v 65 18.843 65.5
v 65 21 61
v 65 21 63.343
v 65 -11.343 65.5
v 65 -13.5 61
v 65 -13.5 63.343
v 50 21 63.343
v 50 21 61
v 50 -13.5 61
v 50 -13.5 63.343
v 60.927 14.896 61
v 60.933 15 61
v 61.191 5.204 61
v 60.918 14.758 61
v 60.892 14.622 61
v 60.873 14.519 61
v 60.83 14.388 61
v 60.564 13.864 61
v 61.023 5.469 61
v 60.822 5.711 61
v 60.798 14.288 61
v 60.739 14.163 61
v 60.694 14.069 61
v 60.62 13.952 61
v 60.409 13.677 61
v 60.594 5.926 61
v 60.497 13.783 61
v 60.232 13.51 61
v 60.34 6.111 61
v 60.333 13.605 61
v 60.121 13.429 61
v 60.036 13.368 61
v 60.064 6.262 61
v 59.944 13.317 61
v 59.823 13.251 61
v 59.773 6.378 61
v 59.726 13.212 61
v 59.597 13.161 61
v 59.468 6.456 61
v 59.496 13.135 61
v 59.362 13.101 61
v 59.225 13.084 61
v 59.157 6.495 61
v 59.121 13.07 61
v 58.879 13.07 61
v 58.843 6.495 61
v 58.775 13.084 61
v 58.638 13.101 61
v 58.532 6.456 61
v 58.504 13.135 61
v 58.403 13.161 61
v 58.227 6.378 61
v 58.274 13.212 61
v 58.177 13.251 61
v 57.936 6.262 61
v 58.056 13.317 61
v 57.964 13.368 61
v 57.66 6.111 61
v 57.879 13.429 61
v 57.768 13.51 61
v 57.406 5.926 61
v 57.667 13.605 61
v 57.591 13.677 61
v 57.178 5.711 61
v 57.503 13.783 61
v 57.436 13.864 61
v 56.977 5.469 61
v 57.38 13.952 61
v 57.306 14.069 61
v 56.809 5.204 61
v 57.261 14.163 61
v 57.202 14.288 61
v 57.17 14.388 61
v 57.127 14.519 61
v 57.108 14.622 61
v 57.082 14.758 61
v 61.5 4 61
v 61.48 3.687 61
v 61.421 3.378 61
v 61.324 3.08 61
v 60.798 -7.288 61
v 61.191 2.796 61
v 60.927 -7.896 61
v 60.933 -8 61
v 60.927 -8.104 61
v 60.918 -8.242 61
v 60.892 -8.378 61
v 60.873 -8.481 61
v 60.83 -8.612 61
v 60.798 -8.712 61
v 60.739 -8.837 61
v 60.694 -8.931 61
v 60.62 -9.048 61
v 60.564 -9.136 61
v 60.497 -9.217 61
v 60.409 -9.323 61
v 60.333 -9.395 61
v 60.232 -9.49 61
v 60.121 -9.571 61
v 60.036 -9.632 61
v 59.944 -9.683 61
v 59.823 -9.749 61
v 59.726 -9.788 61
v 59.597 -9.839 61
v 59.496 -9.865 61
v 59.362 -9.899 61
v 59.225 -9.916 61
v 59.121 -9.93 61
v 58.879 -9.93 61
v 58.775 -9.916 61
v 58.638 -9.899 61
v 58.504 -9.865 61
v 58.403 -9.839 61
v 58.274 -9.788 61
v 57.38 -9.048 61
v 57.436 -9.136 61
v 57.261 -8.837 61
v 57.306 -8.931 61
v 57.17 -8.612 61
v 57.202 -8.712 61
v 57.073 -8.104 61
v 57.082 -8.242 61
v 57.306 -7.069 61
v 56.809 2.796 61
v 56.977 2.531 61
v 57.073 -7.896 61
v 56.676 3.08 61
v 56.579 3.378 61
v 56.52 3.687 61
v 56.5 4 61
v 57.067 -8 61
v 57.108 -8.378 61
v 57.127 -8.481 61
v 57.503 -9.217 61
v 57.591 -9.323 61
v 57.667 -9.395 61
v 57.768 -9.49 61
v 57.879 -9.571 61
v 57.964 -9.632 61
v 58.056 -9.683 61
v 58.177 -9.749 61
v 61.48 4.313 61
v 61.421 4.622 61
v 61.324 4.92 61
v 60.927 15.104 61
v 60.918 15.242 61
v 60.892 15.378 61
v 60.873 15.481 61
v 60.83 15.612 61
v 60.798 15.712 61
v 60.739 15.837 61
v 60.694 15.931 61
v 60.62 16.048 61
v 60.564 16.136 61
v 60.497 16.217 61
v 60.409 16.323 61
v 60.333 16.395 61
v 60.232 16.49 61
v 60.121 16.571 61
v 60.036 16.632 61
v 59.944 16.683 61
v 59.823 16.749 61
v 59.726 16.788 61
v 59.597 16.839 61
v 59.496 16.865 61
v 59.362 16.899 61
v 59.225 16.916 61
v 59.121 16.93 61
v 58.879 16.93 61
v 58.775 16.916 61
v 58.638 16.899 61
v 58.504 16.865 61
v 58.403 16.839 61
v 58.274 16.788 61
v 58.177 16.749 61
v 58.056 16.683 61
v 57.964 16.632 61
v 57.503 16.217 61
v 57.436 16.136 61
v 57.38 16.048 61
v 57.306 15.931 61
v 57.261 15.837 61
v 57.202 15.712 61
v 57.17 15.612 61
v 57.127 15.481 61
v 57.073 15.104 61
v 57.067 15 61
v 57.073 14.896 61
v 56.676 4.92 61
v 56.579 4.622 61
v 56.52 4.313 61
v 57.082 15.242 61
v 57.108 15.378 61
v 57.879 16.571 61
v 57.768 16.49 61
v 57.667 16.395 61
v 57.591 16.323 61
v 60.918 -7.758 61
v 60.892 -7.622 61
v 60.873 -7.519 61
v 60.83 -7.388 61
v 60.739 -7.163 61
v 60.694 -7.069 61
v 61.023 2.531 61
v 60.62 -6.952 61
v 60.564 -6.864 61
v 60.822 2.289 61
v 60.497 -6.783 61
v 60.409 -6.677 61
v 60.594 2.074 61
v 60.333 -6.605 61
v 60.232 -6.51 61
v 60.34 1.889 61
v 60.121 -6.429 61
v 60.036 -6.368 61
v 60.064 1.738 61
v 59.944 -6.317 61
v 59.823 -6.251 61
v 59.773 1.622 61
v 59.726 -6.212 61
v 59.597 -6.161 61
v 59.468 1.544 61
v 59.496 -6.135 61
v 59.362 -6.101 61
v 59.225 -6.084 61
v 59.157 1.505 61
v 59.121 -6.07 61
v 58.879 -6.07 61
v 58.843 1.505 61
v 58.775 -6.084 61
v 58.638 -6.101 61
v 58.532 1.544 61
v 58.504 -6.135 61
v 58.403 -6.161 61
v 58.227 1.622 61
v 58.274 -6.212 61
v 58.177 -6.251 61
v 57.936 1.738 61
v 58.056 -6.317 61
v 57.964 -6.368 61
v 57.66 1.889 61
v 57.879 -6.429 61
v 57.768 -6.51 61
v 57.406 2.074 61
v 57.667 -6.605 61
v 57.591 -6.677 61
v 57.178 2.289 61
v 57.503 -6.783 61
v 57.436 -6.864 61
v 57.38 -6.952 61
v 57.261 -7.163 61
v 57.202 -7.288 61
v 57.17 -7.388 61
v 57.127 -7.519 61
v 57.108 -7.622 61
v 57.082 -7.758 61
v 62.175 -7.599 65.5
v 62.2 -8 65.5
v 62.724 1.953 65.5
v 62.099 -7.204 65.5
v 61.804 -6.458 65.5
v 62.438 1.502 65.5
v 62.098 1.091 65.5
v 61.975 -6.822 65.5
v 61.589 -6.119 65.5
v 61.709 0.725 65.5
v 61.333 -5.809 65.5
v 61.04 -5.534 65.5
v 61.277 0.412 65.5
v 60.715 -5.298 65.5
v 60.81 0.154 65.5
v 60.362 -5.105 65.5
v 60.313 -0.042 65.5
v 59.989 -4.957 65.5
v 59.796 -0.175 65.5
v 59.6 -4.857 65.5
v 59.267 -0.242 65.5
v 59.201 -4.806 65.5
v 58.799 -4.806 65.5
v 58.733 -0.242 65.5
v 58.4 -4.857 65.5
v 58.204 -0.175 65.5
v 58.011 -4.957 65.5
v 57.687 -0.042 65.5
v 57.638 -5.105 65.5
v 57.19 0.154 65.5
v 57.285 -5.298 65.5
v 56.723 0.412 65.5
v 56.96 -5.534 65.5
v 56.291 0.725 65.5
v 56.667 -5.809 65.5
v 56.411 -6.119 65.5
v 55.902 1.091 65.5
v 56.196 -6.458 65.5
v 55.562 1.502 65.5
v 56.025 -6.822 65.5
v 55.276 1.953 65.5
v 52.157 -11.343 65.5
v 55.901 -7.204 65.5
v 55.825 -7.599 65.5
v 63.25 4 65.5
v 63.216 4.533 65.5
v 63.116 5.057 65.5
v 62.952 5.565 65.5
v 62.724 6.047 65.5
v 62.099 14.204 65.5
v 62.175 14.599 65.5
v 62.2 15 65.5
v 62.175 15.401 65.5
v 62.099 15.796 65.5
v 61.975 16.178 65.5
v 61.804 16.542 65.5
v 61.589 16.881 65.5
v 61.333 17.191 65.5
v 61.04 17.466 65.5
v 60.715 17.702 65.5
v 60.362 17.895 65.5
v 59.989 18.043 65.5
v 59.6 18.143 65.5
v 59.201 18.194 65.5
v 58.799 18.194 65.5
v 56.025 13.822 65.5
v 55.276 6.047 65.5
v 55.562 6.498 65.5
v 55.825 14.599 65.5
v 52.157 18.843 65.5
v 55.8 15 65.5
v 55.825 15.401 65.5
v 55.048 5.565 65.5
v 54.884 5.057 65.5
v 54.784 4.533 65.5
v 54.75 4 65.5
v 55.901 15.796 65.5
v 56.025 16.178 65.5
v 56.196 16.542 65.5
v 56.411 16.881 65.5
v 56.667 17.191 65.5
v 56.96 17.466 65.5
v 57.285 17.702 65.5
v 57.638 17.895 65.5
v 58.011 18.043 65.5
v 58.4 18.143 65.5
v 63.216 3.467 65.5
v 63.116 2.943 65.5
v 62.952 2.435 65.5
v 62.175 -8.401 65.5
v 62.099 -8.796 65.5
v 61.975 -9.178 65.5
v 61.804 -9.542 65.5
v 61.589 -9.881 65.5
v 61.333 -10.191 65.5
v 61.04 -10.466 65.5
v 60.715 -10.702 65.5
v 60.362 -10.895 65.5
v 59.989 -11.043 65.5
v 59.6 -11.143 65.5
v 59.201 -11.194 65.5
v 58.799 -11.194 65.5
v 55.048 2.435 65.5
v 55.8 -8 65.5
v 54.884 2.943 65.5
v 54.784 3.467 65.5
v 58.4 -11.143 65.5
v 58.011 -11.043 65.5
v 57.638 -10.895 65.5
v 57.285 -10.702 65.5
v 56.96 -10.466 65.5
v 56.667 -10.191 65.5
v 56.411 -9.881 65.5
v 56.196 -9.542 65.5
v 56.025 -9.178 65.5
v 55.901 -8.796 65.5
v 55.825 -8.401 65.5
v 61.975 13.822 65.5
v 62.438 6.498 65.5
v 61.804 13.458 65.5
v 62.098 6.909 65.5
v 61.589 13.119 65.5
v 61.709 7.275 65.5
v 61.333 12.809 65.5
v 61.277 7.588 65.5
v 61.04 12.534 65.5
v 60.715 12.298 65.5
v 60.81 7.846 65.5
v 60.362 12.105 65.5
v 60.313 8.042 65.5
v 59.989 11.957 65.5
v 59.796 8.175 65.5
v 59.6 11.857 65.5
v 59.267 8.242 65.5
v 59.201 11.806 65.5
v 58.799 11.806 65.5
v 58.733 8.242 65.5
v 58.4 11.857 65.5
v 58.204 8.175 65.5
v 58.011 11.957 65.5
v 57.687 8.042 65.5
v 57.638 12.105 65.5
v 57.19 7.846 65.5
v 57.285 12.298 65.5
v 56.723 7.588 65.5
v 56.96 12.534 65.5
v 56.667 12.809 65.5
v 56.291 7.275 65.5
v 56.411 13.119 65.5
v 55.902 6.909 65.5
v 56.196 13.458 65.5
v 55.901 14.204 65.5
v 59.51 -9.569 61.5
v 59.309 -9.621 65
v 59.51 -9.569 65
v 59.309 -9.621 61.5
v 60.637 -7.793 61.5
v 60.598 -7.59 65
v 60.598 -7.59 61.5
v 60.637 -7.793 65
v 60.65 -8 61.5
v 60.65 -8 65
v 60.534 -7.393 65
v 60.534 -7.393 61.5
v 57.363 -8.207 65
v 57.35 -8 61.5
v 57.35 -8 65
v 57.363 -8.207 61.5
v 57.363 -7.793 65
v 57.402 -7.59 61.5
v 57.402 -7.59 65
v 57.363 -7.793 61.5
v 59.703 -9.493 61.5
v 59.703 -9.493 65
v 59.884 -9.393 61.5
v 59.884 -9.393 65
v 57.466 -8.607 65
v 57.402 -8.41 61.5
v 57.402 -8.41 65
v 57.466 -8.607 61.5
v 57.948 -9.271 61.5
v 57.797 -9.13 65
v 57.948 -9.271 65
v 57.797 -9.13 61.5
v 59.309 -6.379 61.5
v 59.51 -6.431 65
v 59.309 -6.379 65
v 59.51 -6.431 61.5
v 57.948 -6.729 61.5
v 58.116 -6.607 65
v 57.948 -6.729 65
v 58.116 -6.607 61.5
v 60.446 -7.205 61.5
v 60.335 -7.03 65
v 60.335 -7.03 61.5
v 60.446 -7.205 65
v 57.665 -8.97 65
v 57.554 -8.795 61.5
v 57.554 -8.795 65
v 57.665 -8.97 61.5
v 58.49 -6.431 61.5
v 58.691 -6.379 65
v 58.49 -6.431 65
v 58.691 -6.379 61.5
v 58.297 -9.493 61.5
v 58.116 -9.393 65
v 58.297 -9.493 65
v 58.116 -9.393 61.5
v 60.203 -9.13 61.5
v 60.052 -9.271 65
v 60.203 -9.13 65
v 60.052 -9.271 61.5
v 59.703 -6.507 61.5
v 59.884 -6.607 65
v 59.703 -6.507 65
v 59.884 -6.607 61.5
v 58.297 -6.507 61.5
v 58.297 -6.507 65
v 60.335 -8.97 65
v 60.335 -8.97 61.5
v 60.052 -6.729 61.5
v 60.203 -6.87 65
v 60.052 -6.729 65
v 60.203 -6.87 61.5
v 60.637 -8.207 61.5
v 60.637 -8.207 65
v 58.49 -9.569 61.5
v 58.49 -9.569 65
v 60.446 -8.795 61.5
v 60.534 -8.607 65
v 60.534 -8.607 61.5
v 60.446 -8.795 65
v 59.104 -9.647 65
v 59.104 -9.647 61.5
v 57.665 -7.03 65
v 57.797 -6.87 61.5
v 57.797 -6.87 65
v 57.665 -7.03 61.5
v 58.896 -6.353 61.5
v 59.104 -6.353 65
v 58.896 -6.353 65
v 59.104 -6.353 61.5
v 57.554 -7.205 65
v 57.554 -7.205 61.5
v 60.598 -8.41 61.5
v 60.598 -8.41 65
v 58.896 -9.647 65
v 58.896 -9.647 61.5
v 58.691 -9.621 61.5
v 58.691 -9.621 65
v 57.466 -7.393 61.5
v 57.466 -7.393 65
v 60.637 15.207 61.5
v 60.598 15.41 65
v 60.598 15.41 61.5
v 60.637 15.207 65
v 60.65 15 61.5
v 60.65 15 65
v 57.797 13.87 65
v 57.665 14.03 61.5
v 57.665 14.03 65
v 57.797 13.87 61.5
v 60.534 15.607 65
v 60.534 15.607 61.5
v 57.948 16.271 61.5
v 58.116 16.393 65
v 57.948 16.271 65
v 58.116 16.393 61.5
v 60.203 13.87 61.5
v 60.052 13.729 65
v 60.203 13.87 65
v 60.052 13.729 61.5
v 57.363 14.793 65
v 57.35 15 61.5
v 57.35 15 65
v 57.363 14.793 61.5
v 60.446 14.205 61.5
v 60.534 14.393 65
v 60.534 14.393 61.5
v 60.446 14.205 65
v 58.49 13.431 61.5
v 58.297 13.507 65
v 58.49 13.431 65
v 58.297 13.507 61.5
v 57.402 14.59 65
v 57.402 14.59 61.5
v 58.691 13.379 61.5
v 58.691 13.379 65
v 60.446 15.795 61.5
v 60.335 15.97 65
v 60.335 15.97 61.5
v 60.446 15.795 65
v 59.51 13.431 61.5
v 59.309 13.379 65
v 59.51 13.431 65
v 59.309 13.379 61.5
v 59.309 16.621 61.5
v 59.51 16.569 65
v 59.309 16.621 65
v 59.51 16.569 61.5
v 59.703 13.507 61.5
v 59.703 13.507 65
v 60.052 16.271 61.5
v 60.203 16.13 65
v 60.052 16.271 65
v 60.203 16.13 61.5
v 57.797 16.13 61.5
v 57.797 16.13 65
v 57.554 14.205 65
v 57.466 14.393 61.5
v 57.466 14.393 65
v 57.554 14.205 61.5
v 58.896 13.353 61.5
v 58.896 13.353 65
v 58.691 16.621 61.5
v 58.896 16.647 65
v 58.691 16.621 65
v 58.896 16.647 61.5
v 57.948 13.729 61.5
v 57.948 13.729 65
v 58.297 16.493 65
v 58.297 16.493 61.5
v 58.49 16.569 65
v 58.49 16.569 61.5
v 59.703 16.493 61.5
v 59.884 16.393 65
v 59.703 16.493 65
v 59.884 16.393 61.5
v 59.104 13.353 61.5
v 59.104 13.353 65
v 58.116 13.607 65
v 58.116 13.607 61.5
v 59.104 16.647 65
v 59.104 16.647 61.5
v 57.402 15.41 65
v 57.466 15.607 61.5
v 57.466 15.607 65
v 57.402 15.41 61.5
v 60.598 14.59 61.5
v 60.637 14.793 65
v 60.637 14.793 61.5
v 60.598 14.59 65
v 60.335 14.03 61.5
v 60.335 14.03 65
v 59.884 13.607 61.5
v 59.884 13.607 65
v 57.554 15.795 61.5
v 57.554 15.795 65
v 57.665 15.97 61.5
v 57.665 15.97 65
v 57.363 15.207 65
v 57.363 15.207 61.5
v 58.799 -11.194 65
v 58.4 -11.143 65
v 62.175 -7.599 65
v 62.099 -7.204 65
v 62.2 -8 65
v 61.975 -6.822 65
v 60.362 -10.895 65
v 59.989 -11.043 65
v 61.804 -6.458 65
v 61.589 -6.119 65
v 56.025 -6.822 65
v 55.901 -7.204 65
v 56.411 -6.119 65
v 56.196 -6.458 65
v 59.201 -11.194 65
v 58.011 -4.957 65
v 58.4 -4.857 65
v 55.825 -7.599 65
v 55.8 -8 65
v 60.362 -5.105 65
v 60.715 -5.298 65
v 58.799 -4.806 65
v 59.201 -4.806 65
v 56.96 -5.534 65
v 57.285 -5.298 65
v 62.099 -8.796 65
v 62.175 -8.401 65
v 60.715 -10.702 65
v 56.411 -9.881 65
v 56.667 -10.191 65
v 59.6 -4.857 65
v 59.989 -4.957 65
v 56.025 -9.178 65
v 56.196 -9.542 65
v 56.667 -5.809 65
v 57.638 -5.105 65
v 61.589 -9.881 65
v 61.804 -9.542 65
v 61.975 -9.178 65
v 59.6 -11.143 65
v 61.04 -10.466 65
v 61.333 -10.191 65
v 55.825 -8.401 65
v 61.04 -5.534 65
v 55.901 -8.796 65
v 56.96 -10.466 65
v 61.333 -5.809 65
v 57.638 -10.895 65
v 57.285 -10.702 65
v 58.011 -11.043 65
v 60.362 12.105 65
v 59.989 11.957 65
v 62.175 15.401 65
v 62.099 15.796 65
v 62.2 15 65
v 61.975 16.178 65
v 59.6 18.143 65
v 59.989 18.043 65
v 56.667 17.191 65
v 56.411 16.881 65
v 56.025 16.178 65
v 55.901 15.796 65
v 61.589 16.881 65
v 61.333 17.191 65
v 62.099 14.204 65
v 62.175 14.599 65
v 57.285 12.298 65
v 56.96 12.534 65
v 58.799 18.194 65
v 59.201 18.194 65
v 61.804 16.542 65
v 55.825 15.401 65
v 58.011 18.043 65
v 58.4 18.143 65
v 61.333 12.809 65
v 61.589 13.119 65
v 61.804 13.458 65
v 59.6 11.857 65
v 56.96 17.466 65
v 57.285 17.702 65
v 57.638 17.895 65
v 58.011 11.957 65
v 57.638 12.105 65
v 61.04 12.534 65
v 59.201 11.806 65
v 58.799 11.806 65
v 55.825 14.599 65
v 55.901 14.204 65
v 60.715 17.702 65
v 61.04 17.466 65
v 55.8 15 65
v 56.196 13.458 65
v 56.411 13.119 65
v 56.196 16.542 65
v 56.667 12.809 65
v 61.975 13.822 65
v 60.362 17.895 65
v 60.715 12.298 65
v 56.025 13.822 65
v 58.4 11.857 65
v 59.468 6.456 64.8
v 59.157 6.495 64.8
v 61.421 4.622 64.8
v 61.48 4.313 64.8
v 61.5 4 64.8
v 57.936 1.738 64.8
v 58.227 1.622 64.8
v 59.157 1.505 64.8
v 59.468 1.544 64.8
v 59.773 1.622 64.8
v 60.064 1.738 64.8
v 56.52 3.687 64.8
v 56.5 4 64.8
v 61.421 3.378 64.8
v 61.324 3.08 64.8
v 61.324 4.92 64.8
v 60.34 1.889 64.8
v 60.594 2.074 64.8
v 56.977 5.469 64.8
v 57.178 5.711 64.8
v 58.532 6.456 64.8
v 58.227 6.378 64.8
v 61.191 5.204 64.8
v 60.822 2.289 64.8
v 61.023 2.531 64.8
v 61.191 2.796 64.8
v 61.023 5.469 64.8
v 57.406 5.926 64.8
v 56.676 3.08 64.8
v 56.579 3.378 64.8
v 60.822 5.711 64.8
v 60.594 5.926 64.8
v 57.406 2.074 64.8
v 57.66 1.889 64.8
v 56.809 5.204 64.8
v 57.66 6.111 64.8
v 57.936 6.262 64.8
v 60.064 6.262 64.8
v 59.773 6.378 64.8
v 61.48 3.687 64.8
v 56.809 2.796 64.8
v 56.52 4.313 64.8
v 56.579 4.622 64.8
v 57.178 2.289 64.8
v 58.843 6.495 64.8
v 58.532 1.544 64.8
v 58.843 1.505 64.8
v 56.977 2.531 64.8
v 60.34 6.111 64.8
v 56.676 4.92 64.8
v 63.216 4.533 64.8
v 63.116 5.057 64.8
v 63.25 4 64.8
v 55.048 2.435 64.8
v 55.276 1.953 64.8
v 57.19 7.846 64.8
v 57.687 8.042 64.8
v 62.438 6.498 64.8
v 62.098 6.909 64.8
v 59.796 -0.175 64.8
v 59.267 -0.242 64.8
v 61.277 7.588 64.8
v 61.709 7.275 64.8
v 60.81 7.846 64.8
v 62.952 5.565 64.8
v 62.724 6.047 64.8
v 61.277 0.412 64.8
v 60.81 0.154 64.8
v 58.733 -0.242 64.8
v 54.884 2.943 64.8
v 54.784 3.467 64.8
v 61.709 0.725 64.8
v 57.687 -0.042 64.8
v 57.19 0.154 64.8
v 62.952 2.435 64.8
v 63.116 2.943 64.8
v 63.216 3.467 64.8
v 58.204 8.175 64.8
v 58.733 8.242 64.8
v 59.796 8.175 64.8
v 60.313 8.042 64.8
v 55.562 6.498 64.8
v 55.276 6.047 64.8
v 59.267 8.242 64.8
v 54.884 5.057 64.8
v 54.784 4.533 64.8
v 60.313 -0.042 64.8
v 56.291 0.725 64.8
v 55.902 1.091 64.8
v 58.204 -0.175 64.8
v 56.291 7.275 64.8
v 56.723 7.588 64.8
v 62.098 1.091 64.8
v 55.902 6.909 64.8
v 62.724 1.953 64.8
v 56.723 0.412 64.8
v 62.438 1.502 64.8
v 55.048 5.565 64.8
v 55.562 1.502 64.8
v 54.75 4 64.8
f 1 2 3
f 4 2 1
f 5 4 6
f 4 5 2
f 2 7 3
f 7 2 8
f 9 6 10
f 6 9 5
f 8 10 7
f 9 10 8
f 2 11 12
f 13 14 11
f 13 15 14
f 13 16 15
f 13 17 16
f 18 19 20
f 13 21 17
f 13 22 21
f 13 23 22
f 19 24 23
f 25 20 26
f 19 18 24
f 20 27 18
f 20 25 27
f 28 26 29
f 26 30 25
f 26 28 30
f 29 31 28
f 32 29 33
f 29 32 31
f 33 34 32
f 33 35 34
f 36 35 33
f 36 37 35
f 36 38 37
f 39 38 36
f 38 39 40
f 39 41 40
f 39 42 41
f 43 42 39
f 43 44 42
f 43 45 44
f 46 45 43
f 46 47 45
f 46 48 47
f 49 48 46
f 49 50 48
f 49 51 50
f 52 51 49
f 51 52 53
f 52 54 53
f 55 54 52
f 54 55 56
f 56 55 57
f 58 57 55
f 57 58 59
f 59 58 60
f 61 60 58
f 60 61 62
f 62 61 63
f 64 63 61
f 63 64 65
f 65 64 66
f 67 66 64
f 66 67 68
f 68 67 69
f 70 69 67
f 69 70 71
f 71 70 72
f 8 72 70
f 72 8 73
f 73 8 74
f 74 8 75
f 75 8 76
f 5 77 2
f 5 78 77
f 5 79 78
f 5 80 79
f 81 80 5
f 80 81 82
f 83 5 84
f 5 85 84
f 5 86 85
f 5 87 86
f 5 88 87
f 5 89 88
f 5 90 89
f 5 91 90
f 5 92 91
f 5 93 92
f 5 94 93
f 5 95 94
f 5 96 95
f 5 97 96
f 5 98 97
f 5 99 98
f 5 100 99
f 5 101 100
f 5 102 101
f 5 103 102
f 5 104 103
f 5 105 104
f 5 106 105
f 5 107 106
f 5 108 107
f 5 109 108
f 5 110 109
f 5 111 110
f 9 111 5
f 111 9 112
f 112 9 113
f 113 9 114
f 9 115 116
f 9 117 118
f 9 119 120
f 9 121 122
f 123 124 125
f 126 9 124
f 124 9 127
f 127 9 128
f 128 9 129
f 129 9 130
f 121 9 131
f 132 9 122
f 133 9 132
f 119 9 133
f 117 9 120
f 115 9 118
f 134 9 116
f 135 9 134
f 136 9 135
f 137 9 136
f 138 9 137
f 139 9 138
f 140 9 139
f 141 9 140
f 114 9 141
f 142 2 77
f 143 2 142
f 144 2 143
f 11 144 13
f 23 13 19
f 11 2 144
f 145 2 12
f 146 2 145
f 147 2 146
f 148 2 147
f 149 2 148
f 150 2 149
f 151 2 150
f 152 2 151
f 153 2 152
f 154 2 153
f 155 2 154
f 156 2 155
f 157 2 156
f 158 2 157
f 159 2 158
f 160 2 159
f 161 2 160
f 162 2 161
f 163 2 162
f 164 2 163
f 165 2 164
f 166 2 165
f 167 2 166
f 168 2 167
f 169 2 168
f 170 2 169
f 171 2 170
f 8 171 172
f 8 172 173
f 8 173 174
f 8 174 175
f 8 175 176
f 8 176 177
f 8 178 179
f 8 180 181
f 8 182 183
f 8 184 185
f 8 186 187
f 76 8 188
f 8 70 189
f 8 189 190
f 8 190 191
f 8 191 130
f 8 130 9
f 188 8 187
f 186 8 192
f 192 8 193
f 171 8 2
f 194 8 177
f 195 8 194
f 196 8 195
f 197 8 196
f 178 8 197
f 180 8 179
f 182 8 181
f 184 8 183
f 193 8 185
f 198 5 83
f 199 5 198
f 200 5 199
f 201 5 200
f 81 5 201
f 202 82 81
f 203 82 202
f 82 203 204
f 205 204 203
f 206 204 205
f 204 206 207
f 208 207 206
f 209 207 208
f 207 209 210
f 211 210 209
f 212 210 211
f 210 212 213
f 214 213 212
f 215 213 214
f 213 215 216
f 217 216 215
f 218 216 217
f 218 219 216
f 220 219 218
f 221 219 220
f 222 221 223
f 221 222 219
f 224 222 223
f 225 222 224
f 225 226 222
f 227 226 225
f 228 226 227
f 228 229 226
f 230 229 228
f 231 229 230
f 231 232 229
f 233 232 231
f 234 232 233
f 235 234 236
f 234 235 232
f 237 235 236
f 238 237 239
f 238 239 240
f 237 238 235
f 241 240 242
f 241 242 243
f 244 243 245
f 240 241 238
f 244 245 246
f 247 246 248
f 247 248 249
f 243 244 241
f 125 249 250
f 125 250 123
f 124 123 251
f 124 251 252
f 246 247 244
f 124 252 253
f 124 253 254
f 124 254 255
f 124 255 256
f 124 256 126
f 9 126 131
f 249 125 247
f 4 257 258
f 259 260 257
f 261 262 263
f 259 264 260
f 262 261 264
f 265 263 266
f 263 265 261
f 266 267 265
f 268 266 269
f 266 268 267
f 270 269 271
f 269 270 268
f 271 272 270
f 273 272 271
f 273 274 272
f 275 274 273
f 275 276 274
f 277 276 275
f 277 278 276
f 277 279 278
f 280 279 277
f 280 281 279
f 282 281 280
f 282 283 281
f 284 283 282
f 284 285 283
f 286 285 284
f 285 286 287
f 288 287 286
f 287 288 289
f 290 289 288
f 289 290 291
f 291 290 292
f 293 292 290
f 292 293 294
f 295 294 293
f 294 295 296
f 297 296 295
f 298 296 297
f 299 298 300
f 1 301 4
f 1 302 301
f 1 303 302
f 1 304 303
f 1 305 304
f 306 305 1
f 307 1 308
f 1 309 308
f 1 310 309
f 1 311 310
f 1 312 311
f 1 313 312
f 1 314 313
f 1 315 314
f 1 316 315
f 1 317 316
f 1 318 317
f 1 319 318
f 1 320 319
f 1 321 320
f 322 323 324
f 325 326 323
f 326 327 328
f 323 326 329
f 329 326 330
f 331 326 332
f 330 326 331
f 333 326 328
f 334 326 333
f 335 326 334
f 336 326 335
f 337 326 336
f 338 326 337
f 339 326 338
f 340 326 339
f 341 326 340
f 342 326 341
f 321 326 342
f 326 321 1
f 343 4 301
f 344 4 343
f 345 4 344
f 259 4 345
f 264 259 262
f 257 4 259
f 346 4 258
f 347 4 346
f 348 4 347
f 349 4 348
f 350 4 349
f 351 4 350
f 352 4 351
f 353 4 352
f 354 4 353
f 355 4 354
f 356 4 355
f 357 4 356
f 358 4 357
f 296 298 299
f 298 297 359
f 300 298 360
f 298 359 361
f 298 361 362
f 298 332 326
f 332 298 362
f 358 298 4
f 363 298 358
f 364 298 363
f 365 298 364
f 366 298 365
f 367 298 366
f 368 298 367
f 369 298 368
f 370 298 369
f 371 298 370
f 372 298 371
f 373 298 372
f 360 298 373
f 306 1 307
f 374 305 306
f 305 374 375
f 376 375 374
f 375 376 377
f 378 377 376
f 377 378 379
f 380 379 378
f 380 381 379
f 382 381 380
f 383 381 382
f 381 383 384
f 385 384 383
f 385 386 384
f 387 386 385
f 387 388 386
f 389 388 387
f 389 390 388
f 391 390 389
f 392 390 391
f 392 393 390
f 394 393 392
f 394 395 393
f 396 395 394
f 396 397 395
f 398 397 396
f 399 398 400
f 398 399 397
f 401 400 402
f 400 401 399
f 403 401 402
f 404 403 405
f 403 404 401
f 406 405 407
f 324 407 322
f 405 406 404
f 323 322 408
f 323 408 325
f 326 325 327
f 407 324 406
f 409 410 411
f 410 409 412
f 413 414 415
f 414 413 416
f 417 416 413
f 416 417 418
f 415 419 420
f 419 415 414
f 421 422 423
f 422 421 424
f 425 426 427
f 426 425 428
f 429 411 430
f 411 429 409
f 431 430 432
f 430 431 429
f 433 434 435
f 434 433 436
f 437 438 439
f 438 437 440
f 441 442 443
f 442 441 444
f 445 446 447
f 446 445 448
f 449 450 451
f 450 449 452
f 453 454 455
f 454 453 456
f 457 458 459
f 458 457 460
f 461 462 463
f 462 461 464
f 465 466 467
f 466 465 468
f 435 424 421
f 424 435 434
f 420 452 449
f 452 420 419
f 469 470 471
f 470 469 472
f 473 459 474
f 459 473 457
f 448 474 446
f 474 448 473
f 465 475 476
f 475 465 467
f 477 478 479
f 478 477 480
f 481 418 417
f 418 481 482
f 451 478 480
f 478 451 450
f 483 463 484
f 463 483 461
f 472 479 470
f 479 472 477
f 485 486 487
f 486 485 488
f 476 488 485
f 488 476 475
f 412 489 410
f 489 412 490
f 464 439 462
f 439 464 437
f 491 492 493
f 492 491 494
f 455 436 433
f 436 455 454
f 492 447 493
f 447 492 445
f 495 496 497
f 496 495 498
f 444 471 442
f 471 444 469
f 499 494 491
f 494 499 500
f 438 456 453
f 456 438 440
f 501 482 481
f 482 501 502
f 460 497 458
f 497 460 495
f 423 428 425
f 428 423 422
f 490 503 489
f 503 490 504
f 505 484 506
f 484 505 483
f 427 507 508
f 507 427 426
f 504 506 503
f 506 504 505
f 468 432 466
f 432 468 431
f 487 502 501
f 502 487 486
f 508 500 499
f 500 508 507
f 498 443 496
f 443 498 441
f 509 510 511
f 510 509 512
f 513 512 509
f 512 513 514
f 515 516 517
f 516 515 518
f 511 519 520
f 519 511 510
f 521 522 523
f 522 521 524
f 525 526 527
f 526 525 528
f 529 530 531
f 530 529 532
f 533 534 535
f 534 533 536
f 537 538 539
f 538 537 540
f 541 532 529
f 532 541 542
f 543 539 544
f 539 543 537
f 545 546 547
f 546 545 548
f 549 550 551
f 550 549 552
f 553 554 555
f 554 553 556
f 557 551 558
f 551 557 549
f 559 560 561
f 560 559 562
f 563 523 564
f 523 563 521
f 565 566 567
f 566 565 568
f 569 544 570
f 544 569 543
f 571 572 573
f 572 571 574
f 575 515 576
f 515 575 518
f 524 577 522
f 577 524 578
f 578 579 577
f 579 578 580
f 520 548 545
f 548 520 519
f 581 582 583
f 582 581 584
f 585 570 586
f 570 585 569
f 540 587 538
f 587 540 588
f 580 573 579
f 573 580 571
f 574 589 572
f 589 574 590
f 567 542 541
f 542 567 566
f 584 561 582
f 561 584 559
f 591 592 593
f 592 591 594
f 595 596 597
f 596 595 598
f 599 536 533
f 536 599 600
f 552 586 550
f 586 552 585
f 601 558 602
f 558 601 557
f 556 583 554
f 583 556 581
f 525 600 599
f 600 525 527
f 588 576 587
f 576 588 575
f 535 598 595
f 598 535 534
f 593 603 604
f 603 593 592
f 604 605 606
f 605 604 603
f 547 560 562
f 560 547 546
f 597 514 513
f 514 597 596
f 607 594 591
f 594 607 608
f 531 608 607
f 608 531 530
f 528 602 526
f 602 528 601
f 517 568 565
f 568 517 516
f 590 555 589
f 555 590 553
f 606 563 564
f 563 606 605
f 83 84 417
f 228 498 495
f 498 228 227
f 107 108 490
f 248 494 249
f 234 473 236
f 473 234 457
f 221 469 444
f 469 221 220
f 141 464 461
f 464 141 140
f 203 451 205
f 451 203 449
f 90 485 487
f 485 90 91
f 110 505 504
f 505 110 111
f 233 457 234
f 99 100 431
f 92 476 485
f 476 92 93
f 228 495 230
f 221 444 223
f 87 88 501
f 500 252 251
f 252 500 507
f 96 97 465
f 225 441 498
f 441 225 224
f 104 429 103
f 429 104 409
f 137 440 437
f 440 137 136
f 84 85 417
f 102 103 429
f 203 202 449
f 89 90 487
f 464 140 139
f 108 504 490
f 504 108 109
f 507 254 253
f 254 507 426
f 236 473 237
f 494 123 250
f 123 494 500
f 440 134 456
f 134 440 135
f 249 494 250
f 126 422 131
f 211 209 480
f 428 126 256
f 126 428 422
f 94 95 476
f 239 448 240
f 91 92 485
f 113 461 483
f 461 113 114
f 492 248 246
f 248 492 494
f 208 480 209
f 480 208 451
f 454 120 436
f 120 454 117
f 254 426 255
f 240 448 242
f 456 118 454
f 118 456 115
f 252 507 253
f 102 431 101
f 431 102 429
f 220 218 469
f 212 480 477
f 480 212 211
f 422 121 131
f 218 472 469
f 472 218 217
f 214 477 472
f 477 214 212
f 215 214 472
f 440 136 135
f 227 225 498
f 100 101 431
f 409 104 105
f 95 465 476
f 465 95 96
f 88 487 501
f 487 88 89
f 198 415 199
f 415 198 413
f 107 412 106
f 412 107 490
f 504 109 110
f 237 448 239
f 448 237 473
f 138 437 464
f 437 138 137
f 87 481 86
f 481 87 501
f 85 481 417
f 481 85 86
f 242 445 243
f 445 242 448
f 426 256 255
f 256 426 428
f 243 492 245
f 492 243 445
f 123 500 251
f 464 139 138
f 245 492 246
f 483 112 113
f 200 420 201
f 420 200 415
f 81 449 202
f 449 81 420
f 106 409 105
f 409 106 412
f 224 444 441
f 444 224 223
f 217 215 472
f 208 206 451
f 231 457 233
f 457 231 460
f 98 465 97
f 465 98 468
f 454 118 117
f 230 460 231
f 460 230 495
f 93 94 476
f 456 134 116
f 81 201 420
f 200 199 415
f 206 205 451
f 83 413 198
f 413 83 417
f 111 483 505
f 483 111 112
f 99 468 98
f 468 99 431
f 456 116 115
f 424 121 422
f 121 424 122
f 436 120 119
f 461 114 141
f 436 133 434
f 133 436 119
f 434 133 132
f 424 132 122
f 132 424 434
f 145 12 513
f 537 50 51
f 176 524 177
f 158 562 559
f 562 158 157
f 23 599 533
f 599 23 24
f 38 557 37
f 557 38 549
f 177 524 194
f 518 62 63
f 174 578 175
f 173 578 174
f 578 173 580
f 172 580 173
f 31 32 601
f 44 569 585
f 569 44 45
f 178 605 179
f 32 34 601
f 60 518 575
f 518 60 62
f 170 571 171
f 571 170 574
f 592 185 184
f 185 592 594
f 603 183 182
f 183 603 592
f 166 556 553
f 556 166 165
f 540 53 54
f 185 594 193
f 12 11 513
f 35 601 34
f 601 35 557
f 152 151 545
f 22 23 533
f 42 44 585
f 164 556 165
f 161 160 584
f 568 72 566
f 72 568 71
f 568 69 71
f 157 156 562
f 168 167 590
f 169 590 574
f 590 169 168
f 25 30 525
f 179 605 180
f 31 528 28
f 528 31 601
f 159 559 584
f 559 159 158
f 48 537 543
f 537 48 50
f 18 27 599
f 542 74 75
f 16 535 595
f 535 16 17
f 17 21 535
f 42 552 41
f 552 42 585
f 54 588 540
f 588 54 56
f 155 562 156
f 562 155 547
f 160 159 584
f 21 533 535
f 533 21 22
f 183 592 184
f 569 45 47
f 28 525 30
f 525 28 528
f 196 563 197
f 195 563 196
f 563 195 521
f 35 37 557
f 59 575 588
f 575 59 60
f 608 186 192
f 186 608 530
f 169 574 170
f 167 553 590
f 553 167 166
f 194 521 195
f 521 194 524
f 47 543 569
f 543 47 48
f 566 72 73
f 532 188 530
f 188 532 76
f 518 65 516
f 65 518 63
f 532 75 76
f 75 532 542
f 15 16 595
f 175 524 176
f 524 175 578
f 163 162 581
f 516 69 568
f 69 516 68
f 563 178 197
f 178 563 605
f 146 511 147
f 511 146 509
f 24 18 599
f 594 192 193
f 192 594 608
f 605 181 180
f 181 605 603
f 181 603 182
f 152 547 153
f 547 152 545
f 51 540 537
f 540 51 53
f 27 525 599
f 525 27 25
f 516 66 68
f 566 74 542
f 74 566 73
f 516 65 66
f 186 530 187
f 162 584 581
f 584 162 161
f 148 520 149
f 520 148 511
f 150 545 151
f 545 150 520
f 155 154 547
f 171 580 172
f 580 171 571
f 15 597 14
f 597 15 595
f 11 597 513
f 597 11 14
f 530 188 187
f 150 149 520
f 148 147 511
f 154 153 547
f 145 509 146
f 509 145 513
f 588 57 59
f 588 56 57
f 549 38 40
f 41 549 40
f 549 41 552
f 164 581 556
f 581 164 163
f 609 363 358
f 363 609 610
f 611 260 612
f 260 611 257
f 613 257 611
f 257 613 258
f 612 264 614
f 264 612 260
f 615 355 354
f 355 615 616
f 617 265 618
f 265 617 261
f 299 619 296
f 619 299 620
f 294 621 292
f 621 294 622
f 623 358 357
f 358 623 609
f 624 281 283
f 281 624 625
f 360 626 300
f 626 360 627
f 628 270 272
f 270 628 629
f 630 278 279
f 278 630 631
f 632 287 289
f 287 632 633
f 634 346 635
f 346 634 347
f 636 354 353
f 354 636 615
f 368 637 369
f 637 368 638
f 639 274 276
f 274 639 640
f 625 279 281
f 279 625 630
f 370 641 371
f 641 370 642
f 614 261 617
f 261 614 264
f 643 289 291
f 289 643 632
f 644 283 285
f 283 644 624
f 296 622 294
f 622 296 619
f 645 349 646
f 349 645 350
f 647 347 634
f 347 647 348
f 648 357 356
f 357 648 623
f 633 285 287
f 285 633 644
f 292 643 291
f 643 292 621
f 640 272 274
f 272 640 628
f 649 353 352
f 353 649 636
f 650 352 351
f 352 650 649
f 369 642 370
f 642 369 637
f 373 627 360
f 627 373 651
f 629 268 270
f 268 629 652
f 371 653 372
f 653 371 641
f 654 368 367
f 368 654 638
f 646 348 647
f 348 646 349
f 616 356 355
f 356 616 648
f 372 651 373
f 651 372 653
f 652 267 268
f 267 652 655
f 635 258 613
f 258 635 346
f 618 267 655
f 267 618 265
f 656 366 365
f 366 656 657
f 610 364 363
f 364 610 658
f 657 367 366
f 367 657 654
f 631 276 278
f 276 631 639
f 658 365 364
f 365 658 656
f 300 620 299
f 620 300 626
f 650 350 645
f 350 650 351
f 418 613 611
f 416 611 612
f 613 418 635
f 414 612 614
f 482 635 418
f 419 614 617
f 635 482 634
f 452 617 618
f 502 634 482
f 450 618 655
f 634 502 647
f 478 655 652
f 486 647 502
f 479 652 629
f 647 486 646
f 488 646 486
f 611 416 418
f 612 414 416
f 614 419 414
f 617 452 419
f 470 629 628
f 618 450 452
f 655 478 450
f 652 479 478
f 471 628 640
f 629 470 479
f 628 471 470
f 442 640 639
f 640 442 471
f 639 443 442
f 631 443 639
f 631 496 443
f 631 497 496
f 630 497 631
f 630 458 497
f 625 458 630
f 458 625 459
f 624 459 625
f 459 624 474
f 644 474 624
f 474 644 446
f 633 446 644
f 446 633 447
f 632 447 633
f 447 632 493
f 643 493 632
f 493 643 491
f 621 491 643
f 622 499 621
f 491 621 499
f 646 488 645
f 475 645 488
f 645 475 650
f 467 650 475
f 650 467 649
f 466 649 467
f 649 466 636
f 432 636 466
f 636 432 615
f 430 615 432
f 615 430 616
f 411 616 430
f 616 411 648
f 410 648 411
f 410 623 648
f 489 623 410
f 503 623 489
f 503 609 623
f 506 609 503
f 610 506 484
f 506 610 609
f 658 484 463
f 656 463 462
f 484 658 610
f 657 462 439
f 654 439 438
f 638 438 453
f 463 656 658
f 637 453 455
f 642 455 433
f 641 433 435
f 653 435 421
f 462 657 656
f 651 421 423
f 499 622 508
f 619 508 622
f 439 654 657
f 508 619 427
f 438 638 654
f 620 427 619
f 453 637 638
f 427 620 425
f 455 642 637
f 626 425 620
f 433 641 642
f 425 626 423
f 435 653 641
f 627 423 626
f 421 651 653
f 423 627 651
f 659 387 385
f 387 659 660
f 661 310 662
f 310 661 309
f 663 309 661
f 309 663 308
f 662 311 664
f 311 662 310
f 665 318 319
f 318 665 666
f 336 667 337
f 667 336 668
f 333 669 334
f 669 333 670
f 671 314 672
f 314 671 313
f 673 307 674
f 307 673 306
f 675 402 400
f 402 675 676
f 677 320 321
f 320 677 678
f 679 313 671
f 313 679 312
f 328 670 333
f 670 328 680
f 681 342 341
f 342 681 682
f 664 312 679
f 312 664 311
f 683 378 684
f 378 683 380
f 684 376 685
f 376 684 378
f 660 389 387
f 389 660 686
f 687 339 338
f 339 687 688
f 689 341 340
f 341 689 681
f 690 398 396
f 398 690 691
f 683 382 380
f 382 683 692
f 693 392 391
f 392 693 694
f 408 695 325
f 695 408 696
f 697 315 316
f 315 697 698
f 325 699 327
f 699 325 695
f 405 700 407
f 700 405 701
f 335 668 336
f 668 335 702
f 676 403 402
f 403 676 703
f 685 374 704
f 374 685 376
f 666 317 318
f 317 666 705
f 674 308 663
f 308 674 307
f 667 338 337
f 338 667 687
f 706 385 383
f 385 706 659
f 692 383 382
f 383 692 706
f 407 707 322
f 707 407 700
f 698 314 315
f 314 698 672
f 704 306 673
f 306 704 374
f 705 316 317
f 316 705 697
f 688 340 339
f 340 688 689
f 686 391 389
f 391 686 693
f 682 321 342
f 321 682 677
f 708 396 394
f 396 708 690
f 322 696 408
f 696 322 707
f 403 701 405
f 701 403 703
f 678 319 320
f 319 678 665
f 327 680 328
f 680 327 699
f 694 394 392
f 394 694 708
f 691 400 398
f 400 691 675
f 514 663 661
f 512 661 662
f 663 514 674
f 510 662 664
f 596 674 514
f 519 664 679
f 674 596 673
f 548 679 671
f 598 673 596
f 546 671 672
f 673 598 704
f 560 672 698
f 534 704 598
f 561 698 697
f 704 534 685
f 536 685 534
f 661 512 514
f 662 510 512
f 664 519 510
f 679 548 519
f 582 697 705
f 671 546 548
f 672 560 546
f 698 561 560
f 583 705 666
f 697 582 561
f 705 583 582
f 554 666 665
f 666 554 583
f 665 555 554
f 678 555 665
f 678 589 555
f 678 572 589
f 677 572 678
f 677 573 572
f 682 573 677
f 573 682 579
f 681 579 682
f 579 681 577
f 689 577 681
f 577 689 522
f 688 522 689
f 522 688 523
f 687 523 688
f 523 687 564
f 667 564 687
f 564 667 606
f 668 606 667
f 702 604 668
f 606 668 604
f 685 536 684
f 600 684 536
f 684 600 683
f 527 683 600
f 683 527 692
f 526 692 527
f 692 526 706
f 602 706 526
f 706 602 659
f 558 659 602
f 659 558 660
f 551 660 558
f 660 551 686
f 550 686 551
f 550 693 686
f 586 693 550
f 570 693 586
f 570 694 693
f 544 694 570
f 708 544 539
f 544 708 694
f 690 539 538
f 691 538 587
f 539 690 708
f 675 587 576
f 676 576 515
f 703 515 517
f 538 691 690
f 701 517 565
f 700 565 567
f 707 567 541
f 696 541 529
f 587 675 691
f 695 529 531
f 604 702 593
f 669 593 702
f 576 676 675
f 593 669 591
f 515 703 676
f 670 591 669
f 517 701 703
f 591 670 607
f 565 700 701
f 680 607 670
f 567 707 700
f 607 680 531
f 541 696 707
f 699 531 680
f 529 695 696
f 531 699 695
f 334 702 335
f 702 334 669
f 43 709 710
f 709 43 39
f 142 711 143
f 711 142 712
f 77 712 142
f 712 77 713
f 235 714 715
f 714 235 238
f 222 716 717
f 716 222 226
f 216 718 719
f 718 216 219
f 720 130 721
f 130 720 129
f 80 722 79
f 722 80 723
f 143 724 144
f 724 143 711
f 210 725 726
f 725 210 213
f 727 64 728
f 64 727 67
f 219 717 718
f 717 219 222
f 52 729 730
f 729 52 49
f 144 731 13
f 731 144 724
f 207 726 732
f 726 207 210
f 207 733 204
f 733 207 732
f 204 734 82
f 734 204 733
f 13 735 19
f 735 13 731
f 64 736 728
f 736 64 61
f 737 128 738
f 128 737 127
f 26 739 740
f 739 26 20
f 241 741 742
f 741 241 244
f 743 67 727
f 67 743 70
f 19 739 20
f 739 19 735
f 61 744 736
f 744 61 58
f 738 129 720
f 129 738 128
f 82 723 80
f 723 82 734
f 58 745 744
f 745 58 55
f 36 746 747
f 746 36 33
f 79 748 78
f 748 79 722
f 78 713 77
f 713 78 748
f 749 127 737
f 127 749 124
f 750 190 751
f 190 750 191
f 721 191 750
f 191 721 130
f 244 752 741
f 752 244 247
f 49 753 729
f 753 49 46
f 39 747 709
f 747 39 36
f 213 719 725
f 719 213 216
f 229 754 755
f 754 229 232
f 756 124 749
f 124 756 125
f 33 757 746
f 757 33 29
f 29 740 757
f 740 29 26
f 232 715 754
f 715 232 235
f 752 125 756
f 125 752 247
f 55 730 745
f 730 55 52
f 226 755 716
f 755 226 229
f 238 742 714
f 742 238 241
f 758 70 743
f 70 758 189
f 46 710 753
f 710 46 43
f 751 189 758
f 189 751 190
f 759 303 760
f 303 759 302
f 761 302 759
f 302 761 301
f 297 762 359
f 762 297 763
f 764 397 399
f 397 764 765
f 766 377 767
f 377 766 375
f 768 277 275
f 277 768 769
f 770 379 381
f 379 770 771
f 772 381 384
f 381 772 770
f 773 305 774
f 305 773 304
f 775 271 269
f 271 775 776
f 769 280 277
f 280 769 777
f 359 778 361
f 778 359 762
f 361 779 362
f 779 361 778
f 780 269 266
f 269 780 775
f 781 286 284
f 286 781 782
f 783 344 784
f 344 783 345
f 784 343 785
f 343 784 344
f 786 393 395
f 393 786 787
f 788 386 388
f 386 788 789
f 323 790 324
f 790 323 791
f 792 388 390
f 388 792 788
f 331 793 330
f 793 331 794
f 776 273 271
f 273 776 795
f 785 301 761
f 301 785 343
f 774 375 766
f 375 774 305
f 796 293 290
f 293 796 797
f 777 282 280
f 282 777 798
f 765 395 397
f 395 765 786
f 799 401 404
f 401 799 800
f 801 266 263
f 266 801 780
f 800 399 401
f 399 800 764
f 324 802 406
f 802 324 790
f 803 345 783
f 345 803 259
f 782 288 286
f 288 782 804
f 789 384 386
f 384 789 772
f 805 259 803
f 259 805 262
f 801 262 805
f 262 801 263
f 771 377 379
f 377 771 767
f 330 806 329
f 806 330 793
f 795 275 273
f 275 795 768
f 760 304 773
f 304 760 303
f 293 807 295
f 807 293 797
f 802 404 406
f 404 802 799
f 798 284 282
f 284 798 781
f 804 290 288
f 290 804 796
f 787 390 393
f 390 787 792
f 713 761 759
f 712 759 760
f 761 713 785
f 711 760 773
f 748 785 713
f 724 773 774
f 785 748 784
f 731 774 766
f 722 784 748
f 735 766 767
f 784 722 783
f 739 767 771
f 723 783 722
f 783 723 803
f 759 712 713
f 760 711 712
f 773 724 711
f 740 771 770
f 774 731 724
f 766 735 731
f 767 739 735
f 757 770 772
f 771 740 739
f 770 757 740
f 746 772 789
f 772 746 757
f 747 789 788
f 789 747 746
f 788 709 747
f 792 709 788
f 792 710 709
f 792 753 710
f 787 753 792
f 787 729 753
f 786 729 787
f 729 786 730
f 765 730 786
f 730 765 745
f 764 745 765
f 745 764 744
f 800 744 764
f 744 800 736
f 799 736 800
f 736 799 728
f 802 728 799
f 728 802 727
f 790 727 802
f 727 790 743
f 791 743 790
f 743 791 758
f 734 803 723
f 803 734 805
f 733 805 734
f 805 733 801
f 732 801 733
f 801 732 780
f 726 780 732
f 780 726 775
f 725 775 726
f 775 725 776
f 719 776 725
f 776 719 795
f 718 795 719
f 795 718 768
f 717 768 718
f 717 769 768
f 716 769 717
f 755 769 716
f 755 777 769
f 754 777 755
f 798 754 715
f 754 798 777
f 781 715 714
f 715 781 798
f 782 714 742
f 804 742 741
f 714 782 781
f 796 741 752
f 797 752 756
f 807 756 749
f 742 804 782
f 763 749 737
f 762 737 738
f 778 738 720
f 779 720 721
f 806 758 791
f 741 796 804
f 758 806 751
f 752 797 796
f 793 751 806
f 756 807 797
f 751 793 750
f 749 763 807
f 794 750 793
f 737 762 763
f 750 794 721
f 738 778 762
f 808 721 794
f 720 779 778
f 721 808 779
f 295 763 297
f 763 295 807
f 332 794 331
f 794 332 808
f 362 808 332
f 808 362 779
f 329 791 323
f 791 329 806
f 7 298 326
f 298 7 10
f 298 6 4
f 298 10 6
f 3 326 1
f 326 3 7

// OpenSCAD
// PRUSA MMU2
// selector-front-plate
// GNU GPL v3
// Josef Průša <iam@josefprusa.cz> and contributors
// http://www.reprap.org/wiki/Prusa_Mendel
// http://prusamendel.org

module front_plate()
{
    difference()
    {
        translate([50,-65.5,-13.5]) cube([15,4.5,34.5]);
        
        // screws
        translate([59,-48,-8]) rotate([90,0,0]) cylinder(r=1.65, h=30, $fn=50);
        translate([59,-48,15]) rotate([90,0,0]) cylinder(r=1.65, h=30, $fn=50);
        
        translate([59,-60,-8]) rotate([90,0,0]) cylinder(r2=1.65,r1=2.5, h=1.5, $fn=50);
        translate([59,-60,15]) rotate([90,0,0]) cylinder(r2=1.65,r1=2.5, h=1.5, $fn=50);
        
        translate([59,-65,-8]) rotate([90,0,0]) cylinder(r=3.2, h=5, $fn=50);
        translate([59,-65,15]) rotate([90,0,0]) cylinder(r=3.2, h=5, $fn=50);
        
        // brass insert
        translate([59,-60,4]) rotate([90,0,0]) cylinder(r=3.8, h=6, $fn=50); 
        translate([59,-63,4]) rotate([90,0,0]) cylinder(r2=5, r1=3.5, h=2, $fn=50); 
        translate([59,-59.5-1,4]) rotate([90,0,0]) cylinder(r1=5, r2=3.5, h=2, $fn=50); 
        translate([59,-64,4]) rotate([90,0,0]) cylinder(r1=5,r2=5.5, h=2, $fn=50); 
        
        // edges
        translate([45,-64,-15]) rotate([0,0,-45]) cube([15,4,40]);
        translate([45,-64,-18.5]) rotate([45,0,0]) cube([25,4,42]);
        translate([45,-71,19]) rotate([-45,0,0]) cube([25,4,40]);
        
    }
}


module front_plate_M6()
{
    difference()
    {
        translate([50,-65.5,-13.5]) cube([15,4.5,34.5]);
        
        // screws
        translate([59,-48,-8]) rotate([90,0,0]) cylinder(r=1.65, h=30, $fn=50);
        translate([59,-48,15]) rotate([90,0,0]) cylinder(r=1.65, h=30, $fn=50);
        
        translate([59,-60,-8]) rotate([90,0,0]) cylinder(r2=1.65,r1=2.5, h=1.5, $fn=50);
        translate([59,-60,15]) rotate([90,0,0]) cylinder(r2=1.65,r1=2.5, h=1.5, $fn=50);
        
        translate([59,-65,-8]) rotate([90,0,0]) cylinder(r=3.2, h=5, $fn=50);
        translate([59,-65,15]) rotate([90,0,0]) cylinder(r=3.2, h=5, $fn=50);
        
        // brass insert
        translate([59,-60,4]) rotate([90,0,0]) cylinder(r=5/2, h=6, $fn=50); 
        translate([59,-61 -3.8,4]) rotate([90,0,0]) cylinder(r=8.5/2, h=4.5, $fn=50); 
        
        // edges
        translate([45,-64,-15]) rotate([0,0,-45]) cube([15,4,40]);
        translate([45,-64,-18.5]) rotate([45,0,0]) cube([25,4,42]);
        translate([45,-71,19]) rotate([-45,0,0]) cube([25,4,40]);
        
    }
}


rotate([-90,0,0]) 
front_plate_M6();
